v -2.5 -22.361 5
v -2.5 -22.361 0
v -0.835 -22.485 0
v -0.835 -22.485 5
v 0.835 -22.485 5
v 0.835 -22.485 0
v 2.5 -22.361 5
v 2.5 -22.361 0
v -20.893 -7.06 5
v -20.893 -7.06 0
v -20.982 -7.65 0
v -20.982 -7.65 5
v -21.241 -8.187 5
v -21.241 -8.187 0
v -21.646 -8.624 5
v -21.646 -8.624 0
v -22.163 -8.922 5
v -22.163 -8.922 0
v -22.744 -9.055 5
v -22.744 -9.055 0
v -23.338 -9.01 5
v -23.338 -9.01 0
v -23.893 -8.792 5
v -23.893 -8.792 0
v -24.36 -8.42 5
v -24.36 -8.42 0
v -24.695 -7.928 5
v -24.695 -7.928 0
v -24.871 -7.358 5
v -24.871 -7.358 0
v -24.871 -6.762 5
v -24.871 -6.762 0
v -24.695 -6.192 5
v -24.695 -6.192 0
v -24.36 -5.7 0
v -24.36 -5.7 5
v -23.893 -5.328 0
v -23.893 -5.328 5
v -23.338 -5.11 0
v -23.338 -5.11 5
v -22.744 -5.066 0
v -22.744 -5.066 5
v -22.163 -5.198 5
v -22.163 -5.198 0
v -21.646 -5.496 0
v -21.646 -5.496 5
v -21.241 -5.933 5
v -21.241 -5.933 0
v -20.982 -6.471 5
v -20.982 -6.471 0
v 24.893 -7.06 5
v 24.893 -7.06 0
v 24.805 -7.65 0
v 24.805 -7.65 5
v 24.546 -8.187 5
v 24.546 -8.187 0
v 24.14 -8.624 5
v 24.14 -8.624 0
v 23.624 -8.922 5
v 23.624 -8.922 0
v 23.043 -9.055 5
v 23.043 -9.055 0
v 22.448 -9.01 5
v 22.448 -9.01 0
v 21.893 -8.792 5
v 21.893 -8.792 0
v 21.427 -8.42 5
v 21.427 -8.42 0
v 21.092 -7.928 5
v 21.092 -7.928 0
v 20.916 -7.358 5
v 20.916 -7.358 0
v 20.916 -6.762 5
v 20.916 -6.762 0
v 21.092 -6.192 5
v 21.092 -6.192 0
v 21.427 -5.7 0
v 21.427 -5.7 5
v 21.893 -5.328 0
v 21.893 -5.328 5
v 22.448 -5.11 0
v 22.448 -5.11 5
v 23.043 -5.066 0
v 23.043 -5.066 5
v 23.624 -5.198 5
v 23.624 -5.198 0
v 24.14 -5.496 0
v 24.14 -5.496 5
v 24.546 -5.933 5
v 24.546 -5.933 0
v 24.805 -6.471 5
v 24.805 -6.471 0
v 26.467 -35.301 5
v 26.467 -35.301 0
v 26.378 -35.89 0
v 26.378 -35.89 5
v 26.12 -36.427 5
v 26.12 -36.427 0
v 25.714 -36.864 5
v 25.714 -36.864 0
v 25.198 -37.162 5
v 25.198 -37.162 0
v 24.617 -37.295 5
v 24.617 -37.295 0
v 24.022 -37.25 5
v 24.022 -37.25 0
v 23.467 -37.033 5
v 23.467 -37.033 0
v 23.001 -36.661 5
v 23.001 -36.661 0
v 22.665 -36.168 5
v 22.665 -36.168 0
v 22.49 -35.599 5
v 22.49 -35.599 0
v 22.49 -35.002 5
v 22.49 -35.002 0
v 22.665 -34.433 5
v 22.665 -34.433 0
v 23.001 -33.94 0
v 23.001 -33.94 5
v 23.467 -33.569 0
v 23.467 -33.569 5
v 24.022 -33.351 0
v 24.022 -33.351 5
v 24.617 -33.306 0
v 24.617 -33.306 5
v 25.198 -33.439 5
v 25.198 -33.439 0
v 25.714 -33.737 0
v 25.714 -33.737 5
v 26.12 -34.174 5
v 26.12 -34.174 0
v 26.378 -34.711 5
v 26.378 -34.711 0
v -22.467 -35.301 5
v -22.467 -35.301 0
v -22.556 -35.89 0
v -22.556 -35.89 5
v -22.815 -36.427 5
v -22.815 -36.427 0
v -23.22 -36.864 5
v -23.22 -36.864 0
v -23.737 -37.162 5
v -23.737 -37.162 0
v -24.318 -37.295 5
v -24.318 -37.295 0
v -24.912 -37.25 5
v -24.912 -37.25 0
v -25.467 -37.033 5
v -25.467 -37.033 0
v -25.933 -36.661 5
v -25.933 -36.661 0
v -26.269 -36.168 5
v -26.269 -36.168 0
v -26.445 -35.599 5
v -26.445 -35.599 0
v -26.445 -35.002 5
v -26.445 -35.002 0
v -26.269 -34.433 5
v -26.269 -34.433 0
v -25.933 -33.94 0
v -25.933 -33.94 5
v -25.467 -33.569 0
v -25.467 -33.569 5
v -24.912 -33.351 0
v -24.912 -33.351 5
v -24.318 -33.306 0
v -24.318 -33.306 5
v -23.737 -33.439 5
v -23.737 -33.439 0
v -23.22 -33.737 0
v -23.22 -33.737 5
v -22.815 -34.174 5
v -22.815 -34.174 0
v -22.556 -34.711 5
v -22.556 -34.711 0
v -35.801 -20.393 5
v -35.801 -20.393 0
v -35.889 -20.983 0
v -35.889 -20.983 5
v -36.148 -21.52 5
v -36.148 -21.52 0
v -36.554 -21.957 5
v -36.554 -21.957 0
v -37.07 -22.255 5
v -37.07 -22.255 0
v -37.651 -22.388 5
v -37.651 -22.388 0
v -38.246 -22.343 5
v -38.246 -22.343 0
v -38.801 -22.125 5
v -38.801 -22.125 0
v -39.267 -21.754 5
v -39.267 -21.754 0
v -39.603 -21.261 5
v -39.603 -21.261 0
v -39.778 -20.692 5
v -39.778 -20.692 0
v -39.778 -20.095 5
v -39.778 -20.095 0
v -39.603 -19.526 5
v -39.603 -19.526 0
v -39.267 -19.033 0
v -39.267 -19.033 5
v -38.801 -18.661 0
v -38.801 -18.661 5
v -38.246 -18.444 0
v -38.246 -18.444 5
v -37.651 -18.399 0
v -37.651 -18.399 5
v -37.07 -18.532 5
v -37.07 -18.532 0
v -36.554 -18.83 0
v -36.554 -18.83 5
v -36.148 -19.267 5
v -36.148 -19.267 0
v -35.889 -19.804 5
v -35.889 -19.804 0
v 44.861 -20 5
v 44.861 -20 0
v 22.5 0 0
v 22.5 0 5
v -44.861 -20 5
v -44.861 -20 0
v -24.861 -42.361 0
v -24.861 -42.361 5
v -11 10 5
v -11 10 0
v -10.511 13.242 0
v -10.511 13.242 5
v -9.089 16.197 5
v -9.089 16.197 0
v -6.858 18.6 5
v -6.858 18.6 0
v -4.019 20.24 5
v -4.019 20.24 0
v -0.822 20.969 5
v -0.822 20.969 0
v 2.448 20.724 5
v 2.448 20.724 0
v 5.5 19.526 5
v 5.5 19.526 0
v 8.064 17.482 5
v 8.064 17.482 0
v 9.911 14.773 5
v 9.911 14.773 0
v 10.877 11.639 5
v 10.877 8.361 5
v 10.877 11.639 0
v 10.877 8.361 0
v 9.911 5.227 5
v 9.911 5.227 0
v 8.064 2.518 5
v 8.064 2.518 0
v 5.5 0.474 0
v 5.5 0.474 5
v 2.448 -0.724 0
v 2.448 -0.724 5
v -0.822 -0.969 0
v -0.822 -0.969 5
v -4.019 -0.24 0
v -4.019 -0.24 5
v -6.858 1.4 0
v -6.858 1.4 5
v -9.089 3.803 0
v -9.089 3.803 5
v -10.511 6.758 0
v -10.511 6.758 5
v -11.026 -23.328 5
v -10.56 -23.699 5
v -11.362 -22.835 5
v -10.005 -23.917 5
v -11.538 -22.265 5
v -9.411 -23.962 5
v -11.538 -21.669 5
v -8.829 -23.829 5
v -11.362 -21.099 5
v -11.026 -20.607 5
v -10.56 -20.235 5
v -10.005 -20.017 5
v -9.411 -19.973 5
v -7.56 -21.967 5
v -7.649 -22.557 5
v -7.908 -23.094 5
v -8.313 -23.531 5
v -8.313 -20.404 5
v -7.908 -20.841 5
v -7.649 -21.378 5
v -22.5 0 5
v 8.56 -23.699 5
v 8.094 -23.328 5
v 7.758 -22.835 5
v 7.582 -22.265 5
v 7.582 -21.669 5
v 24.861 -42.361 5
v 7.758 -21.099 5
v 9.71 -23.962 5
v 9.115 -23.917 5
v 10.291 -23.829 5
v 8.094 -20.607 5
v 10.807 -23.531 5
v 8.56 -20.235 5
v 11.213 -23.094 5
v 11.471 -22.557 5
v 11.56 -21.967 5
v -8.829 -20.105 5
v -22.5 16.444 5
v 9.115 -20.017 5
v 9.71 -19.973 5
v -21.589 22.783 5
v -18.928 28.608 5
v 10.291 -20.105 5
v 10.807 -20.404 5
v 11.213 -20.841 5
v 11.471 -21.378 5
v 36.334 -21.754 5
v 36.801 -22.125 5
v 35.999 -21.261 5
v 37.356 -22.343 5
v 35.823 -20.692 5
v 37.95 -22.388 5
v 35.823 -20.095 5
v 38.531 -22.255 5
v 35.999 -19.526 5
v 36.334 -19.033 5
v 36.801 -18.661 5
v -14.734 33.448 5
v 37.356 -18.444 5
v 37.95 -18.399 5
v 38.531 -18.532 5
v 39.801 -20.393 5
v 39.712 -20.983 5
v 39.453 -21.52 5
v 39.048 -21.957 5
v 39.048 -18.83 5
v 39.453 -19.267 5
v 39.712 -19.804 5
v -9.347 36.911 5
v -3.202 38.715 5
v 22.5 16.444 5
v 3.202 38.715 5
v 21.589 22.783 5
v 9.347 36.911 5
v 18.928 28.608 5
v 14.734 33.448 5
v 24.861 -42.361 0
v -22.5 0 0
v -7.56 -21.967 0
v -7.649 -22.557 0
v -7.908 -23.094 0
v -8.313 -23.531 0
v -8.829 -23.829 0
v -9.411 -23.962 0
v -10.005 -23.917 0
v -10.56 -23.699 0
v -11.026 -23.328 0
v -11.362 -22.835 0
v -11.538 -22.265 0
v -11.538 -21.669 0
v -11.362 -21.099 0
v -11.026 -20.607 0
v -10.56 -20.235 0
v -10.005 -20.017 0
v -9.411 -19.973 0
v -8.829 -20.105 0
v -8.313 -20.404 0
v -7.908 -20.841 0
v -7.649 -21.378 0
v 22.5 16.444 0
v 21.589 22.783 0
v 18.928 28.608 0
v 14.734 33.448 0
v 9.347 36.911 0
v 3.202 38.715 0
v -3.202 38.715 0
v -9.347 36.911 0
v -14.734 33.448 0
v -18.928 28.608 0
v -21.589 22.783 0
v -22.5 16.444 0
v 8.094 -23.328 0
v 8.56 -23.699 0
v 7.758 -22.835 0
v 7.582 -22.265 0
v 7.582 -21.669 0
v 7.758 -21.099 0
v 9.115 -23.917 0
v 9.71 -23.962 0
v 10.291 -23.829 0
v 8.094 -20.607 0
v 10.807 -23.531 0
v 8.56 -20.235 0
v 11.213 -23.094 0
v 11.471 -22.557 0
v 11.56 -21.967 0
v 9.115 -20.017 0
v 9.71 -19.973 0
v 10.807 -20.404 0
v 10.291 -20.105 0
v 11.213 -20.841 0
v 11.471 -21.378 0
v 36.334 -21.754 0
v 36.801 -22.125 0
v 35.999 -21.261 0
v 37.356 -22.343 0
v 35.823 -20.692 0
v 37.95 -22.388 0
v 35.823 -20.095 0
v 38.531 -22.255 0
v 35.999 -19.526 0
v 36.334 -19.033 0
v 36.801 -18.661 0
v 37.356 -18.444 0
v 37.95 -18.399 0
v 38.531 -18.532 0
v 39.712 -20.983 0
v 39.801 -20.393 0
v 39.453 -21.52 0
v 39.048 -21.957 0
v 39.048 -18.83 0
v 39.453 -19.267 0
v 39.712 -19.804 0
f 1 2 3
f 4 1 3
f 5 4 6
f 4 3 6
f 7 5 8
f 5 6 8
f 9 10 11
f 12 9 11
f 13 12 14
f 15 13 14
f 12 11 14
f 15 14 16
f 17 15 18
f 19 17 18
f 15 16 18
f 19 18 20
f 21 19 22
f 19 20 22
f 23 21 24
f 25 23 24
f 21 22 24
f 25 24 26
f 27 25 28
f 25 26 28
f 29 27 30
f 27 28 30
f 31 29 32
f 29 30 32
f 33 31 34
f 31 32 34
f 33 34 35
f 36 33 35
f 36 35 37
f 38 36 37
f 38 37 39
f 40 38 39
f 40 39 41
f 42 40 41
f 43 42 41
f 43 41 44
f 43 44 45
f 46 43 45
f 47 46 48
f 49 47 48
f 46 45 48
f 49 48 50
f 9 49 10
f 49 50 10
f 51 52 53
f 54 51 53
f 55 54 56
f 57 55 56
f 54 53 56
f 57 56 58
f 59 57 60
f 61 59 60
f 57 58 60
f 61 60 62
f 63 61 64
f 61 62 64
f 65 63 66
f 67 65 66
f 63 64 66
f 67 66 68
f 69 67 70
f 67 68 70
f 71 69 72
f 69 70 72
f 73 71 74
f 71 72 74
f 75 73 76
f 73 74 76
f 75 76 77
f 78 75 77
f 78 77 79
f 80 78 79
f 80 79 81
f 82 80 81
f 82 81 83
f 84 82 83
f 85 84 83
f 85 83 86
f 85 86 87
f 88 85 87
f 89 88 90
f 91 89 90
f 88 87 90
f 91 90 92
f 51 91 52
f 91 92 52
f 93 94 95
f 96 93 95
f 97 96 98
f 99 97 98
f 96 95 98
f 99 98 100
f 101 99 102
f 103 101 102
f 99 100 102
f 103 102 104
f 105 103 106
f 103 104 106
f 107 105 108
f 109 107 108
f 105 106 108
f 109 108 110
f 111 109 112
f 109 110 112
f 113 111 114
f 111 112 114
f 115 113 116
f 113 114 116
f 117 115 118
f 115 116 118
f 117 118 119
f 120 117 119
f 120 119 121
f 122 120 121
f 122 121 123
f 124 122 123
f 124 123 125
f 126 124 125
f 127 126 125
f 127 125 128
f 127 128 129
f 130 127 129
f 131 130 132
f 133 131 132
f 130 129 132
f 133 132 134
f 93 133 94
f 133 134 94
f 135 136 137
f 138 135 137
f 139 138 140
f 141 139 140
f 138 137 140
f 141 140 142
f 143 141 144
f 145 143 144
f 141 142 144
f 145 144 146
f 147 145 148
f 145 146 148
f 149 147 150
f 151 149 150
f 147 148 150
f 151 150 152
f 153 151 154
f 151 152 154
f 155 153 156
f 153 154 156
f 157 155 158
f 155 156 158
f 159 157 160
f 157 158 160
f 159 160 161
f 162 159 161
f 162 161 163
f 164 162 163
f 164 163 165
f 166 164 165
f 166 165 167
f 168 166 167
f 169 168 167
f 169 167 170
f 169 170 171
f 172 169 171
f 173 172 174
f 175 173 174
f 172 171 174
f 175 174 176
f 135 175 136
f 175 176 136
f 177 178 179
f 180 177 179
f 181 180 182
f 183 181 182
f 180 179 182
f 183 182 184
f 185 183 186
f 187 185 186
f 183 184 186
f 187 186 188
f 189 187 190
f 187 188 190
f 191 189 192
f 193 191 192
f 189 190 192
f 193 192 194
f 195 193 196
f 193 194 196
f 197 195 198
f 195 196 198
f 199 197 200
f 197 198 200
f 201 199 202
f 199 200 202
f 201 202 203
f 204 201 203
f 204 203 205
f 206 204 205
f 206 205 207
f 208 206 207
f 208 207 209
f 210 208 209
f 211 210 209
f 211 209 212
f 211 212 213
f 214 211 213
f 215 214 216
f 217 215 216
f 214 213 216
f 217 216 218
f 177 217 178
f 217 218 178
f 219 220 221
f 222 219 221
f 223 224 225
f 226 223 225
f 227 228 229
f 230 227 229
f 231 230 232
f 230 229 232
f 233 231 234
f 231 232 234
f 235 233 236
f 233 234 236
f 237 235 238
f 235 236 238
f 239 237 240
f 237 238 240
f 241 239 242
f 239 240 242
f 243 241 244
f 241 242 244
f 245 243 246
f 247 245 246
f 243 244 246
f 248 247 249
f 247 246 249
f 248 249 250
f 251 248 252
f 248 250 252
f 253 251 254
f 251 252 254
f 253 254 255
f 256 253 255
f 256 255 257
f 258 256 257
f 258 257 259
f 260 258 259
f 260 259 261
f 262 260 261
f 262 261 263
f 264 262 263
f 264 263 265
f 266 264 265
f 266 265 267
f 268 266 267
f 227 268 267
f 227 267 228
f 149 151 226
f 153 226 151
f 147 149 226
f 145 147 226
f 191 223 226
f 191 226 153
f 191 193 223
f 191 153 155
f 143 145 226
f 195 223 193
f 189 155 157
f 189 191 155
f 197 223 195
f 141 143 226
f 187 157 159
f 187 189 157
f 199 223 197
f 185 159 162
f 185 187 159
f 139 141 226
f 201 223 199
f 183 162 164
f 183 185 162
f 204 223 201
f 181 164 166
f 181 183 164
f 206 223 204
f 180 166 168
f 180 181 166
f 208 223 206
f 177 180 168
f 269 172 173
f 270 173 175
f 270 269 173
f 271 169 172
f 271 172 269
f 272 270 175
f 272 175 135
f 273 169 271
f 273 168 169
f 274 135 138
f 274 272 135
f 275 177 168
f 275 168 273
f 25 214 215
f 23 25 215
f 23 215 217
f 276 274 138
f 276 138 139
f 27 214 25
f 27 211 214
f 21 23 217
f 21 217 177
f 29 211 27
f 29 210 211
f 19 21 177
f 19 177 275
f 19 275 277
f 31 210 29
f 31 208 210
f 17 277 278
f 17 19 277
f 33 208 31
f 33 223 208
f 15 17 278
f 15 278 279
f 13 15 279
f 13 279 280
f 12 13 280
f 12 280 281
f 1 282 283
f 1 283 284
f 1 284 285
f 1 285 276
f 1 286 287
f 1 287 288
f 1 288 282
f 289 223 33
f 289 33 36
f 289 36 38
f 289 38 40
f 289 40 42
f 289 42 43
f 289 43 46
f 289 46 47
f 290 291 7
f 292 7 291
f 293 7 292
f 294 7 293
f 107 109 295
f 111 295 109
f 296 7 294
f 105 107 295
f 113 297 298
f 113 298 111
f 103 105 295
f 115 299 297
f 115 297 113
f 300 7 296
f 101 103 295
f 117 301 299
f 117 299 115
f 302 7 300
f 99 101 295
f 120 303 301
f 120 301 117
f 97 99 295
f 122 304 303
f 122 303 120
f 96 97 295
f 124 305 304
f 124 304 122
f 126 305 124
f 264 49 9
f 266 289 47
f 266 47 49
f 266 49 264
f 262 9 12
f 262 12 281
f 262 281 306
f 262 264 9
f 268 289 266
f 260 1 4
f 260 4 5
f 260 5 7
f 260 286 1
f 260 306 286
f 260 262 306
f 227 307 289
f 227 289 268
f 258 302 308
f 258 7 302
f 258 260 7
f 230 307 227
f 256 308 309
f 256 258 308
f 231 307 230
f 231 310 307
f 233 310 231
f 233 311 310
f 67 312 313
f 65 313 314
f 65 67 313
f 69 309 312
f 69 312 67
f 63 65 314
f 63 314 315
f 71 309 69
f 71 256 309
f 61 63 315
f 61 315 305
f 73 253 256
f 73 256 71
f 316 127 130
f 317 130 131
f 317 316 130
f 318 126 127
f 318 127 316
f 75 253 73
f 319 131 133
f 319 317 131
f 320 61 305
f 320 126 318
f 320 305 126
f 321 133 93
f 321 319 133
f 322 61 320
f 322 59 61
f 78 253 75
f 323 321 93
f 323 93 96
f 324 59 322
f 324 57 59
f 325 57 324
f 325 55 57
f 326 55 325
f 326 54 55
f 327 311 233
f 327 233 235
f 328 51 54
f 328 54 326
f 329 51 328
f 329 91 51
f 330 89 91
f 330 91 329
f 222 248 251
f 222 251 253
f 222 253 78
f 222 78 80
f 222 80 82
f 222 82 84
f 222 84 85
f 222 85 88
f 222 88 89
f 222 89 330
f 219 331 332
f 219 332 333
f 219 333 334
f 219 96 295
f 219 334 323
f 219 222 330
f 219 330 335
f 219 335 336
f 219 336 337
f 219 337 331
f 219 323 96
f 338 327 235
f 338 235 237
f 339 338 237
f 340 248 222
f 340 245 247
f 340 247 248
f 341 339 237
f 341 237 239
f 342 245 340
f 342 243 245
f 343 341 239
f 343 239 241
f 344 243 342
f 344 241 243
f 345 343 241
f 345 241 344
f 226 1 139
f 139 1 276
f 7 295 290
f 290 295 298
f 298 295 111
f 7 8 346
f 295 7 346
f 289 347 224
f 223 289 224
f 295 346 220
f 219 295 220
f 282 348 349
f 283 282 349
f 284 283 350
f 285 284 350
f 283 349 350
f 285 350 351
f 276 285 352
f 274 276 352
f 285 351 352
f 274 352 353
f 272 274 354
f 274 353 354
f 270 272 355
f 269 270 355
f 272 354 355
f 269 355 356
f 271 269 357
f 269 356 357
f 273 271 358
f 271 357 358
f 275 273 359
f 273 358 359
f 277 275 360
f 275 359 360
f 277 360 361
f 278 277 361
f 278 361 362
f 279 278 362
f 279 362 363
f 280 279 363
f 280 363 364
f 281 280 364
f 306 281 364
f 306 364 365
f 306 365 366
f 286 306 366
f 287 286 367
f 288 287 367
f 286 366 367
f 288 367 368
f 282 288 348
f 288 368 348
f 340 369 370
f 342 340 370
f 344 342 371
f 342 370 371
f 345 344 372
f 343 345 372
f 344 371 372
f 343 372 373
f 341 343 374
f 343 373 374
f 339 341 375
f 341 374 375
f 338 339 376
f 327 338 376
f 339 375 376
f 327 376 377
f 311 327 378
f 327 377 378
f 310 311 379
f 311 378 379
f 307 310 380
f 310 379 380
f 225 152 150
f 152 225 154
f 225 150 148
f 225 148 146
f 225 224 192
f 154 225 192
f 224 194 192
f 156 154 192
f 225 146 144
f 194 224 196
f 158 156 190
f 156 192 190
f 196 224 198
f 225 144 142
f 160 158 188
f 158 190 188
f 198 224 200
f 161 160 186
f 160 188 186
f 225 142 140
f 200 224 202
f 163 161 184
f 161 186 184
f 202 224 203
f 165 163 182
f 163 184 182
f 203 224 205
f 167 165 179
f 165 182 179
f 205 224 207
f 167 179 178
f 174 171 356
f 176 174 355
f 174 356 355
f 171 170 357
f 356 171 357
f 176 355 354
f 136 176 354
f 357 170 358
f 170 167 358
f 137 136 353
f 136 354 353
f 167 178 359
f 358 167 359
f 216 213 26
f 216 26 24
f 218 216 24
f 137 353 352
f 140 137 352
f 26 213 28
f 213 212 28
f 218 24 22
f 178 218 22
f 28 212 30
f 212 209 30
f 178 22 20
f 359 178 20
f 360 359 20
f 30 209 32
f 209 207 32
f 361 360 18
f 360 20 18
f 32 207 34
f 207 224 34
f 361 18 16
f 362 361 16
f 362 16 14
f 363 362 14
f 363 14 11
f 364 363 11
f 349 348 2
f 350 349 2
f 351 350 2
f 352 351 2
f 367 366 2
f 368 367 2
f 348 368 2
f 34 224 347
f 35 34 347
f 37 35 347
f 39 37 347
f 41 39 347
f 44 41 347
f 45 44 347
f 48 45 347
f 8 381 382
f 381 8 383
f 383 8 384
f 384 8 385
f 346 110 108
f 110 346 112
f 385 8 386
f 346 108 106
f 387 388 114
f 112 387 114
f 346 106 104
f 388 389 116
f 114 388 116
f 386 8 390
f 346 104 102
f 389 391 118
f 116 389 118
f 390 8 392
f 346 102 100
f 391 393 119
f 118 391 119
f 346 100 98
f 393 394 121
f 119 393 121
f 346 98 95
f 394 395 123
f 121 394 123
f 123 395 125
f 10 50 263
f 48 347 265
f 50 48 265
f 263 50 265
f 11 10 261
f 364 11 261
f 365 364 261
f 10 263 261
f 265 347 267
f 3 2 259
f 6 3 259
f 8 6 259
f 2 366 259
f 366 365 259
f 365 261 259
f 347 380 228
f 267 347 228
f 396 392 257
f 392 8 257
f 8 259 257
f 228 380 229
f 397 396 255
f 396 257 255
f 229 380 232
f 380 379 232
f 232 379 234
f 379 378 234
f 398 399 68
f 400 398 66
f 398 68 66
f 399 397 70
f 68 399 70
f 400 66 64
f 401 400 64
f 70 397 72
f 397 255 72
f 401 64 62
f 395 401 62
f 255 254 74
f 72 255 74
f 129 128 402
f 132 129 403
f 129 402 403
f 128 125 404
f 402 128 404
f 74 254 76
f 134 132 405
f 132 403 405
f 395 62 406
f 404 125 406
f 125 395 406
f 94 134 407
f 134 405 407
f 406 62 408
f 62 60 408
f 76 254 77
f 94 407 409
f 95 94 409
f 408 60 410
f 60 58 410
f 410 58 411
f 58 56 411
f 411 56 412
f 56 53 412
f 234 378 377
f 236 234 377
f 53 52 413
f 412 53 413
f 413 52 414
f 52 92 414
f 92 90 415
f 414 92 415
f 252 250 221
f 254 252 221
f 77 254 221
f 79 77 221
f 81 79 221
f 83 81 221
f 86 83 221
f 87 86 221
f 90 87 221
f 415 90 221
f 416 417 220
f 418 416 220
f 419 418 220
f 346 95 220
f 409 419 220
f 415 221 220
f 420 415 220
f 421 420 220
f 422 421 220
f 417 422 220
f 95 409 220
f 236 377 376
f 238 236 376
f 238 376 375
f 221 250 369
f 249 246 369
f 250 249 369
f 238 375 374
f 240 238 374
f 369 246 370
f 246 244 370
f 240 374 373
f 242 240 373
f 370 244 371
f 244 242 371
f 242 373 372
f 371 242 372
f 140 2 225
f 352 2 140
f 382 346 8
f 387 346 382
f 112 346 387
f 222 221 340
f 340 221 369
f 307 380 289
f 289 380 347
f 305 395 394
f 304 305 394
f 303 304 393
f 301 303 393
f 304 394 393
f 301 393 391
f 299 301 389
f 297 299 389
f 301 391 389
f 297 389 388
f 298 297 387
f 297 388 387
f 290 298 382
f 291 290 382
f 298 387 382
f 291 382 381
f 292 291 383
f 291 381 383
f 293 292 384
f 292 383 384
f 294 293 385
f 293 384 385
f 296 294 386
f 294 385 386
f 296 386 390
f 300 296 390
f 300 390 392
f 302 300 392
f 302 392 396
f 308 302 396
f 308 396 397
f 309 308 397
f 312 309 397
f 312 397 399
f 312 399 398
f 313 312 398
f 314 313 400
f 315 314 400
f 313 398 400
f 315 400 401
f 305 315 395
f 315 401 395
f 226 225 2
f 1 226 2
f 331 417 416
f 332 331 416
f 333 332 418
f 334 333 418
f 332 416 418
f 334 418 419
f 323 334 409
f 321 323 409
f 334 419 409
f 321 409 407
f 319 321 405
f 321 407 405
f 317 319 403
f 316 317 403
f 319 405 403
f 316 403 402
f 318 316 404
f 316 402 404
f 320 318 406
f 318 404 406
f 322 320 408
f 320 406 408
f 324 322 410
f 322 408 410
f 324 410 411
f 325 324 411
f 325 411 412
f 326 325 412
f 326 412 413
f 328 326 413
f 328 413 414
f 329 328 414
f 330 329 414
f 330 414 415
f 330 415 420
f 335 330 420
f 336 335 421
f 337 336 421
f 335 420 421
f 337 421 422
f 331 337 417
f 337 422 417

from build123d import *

# Parameters (mm, degrees)
BOSS_EXTRUDE1_DEPTH = 5
SKETCH3_R           = 2
CUT_EXTRUDE1_DEPTH  = 5
SKETCH4_R           = 11
CUT_EXTRUDE2_DEPTH  = 10


with BuildPart() as part:
    # Sketch2 → Boss-Extrude1 (new body)
    with BuildSketch(Plane.XY):
        with BuildLine():
            Line((-15.357210304, 0), (-22.5, 0))
            Line((-22.5, 0), (-2.5, -22.360679775))
            ThreePointArc((-2.5, -22.360679775), (0, -22.5), (2.5, -22.360679775))
            Line((2.5, -22.360679775), (22.5, 0))
            Line((22.5, 0), (15.357210304, 0))
            ThreePointArc((15.357210304, 0), (0, -6.055970942), (-15.357210304, 0))
        make_face()
        with BuildLine():
            ThreePointArc((-2.5, -22.360679775), (-16.770509831, -15), (-22.5, 0))
            Line((-22.5, 0), (-44.860679775, -20))
            Line((-44.860679775, -20), (-24.860679775, -42.360679775))
            Line((-24.860679775, -42.360679775), (-2.5, -22.360679775))
        make_face()
        with BuildLine():
            ThreePointArc((-20.943936523, 8.222014529), (-22.107561735, 4.183983044), (-22.5, 0))
            Line((-22.5, 0), (-15.357210304, 0))
            ThreePointArc((-15.357210304, 0), (-18.61031155, 3.798622619), (-20.943936523, 8.222014529))
        make_face()
        with BuildLine():
            Line((-2.5, -22.360679775), (-22.5, 0))
            ThreePointArc((-22.5, 0), (-16.770509831, -15), (-2.5, -22.360679775))
        make_face()
        with BuildLine():
            Line((-22.5, 16.444029058), (-22.5, 0))
            ThreePointArc((-22.5, 0), (-22.107561735, 4.183983044), (-20.943936523, 8.222014529))
            ThreePointArc((-20.943936523, 8.222014529), (-22.107561735, 12.260046014), (-22.5, 16.444029058))
        make_face()
        with BuildLine():
            ThreePointArc((22.5, 16.444029058), (0, 38.944029058), (-22.5, 16.444029058))
            Line((-22.5, 16.444029058), (-15.357210304, 16.444029058))
            ThreePointArc((-15.357210304, 16.444029058), (0, 22.5), (15.357210304, 16.444029058))
            Line((15.357210304, 16.444029058), (22.5, 16.444029058))
        make_face()
        with BuildLine():
            Line((-15.357210304, 16.444029058), (-22.5, 16.444029058))
            ThreePointArc((-22.5, 16.444029058), (-22.107561735, 12.260046014), (-20.943936523, 8.222014529))
            ThreePointArc((-20.943936523, 8.222014529), (-18.61031155, 12.64540644), (-15.357210304, 16.444029058))
        make_face()
        with BuildLine():
            ThreePointArc((-20.943936523, 8.222014529), (-18.61031155, 3.798622619), (-15.357210304, 0))
            Line((-15.357210304, 0), (15.357210304, 0))
            ThreePointArc((15.357210304, 0), (18.61031155, 3.798622619), (20.943936523, 8.222014529))
            ThreePointArc((20.943936523, 8.222014529), (18.61031155, 12.64540644), (15.357210304, 16.444029058))
            Line((15.357210304, 16.444029058), (-15.357210304, 16.444029058))
            ThreePointArc((-15.357210304, 16.444029058), (-18.61031155, 12.64540644), (-20.943936523, 8.222014529))
        make_face()
        with BuildLine():
            Line((15.357210304, 0), (-15.357210304, 0))
            ThreePointArc((-15.357210304, 0), (0, -6.055970942), (15.357210304, 0))
        make_face()
        with BuildLine():
            ThreePointArc((22.5, 0), (16.770509831, -15), (2.5, -22.360679775))
            Line((2.5, -22.360679775), (24.860679775, -42.360679775))
            Line((24.860679775, -42.360679775), (44.860679775, -20))
            Line((44.860679775, -20), (22.5, 0))
        make_face()
        with BuildLine():
            Line((22.5, 0), (2.5, -22.360679775))
            ThreePointArc((2.5, -22.360679775), (16.770509831, -15), (22.5, 0))
        make_face()
        with BuildLine():
            ThreePointArc((15.357210304, 16.444029058), (0, 22.5), (-15.357210304, 16.444029058))
            Line((-15.357210304, 16.444029058), (15.357210304, 16.444029058))
        make_face()
        with BuildLine():
            ThreePointArc((20.943936523, 8.222014529), (22.107561735, 12.260046014), (22.5, 16.444029058))
            Line((22.5, 16.444029058), (15.357210304, 16.444029058))
            ThreePointArc((15.357210304, 16.444029058), (18.61031155, 12.64540644), (20.943936523, 8.222014529))
        make_face()
        with BuildLine():
            Line((22.5, 0), (22.5, 16.444029058))
            ThreePointArc((22.5, 16.444029058), (22.107561735, 12.260046014), (20.943936523, 8.222014529))
            ThreePointArc((20.943936523, 8.222014529), (22.107561735, 4.183983044), (22.5, 0))
        make_face()
        with BuildLine():
            ThreePointArc((20.943936523, 8.222014529), (18.61031155, 3.798622619), (15.357210304, 0))
            Line((15.357210304, 0), (22.5, 0))
            ThreePointArc((22.5, 0), (22.107561735, 4.183983044), (20.943936523, 8.222014529))
        make_face()
    extrude(amount=BOSS_EXTRUDE1_DEPTH)

    # Sketch3 → Cut-Extrude1 (cut)
    with BuildSketch(Plane(origin=(0, 0, 0), x_dir=(-1, 0, 0), z_dir=(0, 0, -1))):
        with Locations(Location((-37.800566479, -20.393446629, 0), (0, 0, 180))):
            Circle(SKETCH3_R)
        with Locations(Location((-22.893446629, -7.060113296, 0), (0, 0, 180))):
            Circle(SKETCH3_R)
        with Locations(Location((-9.560113296, -21.967233146, 0), (0, 0, 180))):
            Circle(SKETCH3_R)
        with Locations(Location((-24.467233146, -35.300566479, 0), (0, 0, 180))):
            Circle(SKETCH3_R)
        with Locations(Location((24.467233146, -35.300566479, 0), (0, 0, 180))):
            Circle(SKETCH3_R)
        with Locations(Location((37.800566479, -20.393446629, 0), (0, 0, 180))):
            Circle(SKETCH3_R)
        with Locations(Location((9.560113296, -21.967233146, 0), (0, 0, 180))):
            Circle(SKETCH3_R)
        with Locations(Location((22.893446629, -7.060113296, 0), (0, 0, 180))):
            Circle(SKETCH3_R)
    extrude(amount=-CUT_EXTRUDE1_DEPTH, mode=Mode.SUBTRACT)

    # Sketch4 → Cut-Extrude2 (cut)
    with BuildSketch(Plane(origin=(0, 0, 0), x_dir=(-1, 0, 0), z_dir=(0, 0, -1))):
        with Locations((0, 10)):
            Circle(SKETCH4_R)
    extrude(amount=-CUT_EXTRUDE2_DEPTH, mode=Mode.SUBTRACT)


solid = part.part
